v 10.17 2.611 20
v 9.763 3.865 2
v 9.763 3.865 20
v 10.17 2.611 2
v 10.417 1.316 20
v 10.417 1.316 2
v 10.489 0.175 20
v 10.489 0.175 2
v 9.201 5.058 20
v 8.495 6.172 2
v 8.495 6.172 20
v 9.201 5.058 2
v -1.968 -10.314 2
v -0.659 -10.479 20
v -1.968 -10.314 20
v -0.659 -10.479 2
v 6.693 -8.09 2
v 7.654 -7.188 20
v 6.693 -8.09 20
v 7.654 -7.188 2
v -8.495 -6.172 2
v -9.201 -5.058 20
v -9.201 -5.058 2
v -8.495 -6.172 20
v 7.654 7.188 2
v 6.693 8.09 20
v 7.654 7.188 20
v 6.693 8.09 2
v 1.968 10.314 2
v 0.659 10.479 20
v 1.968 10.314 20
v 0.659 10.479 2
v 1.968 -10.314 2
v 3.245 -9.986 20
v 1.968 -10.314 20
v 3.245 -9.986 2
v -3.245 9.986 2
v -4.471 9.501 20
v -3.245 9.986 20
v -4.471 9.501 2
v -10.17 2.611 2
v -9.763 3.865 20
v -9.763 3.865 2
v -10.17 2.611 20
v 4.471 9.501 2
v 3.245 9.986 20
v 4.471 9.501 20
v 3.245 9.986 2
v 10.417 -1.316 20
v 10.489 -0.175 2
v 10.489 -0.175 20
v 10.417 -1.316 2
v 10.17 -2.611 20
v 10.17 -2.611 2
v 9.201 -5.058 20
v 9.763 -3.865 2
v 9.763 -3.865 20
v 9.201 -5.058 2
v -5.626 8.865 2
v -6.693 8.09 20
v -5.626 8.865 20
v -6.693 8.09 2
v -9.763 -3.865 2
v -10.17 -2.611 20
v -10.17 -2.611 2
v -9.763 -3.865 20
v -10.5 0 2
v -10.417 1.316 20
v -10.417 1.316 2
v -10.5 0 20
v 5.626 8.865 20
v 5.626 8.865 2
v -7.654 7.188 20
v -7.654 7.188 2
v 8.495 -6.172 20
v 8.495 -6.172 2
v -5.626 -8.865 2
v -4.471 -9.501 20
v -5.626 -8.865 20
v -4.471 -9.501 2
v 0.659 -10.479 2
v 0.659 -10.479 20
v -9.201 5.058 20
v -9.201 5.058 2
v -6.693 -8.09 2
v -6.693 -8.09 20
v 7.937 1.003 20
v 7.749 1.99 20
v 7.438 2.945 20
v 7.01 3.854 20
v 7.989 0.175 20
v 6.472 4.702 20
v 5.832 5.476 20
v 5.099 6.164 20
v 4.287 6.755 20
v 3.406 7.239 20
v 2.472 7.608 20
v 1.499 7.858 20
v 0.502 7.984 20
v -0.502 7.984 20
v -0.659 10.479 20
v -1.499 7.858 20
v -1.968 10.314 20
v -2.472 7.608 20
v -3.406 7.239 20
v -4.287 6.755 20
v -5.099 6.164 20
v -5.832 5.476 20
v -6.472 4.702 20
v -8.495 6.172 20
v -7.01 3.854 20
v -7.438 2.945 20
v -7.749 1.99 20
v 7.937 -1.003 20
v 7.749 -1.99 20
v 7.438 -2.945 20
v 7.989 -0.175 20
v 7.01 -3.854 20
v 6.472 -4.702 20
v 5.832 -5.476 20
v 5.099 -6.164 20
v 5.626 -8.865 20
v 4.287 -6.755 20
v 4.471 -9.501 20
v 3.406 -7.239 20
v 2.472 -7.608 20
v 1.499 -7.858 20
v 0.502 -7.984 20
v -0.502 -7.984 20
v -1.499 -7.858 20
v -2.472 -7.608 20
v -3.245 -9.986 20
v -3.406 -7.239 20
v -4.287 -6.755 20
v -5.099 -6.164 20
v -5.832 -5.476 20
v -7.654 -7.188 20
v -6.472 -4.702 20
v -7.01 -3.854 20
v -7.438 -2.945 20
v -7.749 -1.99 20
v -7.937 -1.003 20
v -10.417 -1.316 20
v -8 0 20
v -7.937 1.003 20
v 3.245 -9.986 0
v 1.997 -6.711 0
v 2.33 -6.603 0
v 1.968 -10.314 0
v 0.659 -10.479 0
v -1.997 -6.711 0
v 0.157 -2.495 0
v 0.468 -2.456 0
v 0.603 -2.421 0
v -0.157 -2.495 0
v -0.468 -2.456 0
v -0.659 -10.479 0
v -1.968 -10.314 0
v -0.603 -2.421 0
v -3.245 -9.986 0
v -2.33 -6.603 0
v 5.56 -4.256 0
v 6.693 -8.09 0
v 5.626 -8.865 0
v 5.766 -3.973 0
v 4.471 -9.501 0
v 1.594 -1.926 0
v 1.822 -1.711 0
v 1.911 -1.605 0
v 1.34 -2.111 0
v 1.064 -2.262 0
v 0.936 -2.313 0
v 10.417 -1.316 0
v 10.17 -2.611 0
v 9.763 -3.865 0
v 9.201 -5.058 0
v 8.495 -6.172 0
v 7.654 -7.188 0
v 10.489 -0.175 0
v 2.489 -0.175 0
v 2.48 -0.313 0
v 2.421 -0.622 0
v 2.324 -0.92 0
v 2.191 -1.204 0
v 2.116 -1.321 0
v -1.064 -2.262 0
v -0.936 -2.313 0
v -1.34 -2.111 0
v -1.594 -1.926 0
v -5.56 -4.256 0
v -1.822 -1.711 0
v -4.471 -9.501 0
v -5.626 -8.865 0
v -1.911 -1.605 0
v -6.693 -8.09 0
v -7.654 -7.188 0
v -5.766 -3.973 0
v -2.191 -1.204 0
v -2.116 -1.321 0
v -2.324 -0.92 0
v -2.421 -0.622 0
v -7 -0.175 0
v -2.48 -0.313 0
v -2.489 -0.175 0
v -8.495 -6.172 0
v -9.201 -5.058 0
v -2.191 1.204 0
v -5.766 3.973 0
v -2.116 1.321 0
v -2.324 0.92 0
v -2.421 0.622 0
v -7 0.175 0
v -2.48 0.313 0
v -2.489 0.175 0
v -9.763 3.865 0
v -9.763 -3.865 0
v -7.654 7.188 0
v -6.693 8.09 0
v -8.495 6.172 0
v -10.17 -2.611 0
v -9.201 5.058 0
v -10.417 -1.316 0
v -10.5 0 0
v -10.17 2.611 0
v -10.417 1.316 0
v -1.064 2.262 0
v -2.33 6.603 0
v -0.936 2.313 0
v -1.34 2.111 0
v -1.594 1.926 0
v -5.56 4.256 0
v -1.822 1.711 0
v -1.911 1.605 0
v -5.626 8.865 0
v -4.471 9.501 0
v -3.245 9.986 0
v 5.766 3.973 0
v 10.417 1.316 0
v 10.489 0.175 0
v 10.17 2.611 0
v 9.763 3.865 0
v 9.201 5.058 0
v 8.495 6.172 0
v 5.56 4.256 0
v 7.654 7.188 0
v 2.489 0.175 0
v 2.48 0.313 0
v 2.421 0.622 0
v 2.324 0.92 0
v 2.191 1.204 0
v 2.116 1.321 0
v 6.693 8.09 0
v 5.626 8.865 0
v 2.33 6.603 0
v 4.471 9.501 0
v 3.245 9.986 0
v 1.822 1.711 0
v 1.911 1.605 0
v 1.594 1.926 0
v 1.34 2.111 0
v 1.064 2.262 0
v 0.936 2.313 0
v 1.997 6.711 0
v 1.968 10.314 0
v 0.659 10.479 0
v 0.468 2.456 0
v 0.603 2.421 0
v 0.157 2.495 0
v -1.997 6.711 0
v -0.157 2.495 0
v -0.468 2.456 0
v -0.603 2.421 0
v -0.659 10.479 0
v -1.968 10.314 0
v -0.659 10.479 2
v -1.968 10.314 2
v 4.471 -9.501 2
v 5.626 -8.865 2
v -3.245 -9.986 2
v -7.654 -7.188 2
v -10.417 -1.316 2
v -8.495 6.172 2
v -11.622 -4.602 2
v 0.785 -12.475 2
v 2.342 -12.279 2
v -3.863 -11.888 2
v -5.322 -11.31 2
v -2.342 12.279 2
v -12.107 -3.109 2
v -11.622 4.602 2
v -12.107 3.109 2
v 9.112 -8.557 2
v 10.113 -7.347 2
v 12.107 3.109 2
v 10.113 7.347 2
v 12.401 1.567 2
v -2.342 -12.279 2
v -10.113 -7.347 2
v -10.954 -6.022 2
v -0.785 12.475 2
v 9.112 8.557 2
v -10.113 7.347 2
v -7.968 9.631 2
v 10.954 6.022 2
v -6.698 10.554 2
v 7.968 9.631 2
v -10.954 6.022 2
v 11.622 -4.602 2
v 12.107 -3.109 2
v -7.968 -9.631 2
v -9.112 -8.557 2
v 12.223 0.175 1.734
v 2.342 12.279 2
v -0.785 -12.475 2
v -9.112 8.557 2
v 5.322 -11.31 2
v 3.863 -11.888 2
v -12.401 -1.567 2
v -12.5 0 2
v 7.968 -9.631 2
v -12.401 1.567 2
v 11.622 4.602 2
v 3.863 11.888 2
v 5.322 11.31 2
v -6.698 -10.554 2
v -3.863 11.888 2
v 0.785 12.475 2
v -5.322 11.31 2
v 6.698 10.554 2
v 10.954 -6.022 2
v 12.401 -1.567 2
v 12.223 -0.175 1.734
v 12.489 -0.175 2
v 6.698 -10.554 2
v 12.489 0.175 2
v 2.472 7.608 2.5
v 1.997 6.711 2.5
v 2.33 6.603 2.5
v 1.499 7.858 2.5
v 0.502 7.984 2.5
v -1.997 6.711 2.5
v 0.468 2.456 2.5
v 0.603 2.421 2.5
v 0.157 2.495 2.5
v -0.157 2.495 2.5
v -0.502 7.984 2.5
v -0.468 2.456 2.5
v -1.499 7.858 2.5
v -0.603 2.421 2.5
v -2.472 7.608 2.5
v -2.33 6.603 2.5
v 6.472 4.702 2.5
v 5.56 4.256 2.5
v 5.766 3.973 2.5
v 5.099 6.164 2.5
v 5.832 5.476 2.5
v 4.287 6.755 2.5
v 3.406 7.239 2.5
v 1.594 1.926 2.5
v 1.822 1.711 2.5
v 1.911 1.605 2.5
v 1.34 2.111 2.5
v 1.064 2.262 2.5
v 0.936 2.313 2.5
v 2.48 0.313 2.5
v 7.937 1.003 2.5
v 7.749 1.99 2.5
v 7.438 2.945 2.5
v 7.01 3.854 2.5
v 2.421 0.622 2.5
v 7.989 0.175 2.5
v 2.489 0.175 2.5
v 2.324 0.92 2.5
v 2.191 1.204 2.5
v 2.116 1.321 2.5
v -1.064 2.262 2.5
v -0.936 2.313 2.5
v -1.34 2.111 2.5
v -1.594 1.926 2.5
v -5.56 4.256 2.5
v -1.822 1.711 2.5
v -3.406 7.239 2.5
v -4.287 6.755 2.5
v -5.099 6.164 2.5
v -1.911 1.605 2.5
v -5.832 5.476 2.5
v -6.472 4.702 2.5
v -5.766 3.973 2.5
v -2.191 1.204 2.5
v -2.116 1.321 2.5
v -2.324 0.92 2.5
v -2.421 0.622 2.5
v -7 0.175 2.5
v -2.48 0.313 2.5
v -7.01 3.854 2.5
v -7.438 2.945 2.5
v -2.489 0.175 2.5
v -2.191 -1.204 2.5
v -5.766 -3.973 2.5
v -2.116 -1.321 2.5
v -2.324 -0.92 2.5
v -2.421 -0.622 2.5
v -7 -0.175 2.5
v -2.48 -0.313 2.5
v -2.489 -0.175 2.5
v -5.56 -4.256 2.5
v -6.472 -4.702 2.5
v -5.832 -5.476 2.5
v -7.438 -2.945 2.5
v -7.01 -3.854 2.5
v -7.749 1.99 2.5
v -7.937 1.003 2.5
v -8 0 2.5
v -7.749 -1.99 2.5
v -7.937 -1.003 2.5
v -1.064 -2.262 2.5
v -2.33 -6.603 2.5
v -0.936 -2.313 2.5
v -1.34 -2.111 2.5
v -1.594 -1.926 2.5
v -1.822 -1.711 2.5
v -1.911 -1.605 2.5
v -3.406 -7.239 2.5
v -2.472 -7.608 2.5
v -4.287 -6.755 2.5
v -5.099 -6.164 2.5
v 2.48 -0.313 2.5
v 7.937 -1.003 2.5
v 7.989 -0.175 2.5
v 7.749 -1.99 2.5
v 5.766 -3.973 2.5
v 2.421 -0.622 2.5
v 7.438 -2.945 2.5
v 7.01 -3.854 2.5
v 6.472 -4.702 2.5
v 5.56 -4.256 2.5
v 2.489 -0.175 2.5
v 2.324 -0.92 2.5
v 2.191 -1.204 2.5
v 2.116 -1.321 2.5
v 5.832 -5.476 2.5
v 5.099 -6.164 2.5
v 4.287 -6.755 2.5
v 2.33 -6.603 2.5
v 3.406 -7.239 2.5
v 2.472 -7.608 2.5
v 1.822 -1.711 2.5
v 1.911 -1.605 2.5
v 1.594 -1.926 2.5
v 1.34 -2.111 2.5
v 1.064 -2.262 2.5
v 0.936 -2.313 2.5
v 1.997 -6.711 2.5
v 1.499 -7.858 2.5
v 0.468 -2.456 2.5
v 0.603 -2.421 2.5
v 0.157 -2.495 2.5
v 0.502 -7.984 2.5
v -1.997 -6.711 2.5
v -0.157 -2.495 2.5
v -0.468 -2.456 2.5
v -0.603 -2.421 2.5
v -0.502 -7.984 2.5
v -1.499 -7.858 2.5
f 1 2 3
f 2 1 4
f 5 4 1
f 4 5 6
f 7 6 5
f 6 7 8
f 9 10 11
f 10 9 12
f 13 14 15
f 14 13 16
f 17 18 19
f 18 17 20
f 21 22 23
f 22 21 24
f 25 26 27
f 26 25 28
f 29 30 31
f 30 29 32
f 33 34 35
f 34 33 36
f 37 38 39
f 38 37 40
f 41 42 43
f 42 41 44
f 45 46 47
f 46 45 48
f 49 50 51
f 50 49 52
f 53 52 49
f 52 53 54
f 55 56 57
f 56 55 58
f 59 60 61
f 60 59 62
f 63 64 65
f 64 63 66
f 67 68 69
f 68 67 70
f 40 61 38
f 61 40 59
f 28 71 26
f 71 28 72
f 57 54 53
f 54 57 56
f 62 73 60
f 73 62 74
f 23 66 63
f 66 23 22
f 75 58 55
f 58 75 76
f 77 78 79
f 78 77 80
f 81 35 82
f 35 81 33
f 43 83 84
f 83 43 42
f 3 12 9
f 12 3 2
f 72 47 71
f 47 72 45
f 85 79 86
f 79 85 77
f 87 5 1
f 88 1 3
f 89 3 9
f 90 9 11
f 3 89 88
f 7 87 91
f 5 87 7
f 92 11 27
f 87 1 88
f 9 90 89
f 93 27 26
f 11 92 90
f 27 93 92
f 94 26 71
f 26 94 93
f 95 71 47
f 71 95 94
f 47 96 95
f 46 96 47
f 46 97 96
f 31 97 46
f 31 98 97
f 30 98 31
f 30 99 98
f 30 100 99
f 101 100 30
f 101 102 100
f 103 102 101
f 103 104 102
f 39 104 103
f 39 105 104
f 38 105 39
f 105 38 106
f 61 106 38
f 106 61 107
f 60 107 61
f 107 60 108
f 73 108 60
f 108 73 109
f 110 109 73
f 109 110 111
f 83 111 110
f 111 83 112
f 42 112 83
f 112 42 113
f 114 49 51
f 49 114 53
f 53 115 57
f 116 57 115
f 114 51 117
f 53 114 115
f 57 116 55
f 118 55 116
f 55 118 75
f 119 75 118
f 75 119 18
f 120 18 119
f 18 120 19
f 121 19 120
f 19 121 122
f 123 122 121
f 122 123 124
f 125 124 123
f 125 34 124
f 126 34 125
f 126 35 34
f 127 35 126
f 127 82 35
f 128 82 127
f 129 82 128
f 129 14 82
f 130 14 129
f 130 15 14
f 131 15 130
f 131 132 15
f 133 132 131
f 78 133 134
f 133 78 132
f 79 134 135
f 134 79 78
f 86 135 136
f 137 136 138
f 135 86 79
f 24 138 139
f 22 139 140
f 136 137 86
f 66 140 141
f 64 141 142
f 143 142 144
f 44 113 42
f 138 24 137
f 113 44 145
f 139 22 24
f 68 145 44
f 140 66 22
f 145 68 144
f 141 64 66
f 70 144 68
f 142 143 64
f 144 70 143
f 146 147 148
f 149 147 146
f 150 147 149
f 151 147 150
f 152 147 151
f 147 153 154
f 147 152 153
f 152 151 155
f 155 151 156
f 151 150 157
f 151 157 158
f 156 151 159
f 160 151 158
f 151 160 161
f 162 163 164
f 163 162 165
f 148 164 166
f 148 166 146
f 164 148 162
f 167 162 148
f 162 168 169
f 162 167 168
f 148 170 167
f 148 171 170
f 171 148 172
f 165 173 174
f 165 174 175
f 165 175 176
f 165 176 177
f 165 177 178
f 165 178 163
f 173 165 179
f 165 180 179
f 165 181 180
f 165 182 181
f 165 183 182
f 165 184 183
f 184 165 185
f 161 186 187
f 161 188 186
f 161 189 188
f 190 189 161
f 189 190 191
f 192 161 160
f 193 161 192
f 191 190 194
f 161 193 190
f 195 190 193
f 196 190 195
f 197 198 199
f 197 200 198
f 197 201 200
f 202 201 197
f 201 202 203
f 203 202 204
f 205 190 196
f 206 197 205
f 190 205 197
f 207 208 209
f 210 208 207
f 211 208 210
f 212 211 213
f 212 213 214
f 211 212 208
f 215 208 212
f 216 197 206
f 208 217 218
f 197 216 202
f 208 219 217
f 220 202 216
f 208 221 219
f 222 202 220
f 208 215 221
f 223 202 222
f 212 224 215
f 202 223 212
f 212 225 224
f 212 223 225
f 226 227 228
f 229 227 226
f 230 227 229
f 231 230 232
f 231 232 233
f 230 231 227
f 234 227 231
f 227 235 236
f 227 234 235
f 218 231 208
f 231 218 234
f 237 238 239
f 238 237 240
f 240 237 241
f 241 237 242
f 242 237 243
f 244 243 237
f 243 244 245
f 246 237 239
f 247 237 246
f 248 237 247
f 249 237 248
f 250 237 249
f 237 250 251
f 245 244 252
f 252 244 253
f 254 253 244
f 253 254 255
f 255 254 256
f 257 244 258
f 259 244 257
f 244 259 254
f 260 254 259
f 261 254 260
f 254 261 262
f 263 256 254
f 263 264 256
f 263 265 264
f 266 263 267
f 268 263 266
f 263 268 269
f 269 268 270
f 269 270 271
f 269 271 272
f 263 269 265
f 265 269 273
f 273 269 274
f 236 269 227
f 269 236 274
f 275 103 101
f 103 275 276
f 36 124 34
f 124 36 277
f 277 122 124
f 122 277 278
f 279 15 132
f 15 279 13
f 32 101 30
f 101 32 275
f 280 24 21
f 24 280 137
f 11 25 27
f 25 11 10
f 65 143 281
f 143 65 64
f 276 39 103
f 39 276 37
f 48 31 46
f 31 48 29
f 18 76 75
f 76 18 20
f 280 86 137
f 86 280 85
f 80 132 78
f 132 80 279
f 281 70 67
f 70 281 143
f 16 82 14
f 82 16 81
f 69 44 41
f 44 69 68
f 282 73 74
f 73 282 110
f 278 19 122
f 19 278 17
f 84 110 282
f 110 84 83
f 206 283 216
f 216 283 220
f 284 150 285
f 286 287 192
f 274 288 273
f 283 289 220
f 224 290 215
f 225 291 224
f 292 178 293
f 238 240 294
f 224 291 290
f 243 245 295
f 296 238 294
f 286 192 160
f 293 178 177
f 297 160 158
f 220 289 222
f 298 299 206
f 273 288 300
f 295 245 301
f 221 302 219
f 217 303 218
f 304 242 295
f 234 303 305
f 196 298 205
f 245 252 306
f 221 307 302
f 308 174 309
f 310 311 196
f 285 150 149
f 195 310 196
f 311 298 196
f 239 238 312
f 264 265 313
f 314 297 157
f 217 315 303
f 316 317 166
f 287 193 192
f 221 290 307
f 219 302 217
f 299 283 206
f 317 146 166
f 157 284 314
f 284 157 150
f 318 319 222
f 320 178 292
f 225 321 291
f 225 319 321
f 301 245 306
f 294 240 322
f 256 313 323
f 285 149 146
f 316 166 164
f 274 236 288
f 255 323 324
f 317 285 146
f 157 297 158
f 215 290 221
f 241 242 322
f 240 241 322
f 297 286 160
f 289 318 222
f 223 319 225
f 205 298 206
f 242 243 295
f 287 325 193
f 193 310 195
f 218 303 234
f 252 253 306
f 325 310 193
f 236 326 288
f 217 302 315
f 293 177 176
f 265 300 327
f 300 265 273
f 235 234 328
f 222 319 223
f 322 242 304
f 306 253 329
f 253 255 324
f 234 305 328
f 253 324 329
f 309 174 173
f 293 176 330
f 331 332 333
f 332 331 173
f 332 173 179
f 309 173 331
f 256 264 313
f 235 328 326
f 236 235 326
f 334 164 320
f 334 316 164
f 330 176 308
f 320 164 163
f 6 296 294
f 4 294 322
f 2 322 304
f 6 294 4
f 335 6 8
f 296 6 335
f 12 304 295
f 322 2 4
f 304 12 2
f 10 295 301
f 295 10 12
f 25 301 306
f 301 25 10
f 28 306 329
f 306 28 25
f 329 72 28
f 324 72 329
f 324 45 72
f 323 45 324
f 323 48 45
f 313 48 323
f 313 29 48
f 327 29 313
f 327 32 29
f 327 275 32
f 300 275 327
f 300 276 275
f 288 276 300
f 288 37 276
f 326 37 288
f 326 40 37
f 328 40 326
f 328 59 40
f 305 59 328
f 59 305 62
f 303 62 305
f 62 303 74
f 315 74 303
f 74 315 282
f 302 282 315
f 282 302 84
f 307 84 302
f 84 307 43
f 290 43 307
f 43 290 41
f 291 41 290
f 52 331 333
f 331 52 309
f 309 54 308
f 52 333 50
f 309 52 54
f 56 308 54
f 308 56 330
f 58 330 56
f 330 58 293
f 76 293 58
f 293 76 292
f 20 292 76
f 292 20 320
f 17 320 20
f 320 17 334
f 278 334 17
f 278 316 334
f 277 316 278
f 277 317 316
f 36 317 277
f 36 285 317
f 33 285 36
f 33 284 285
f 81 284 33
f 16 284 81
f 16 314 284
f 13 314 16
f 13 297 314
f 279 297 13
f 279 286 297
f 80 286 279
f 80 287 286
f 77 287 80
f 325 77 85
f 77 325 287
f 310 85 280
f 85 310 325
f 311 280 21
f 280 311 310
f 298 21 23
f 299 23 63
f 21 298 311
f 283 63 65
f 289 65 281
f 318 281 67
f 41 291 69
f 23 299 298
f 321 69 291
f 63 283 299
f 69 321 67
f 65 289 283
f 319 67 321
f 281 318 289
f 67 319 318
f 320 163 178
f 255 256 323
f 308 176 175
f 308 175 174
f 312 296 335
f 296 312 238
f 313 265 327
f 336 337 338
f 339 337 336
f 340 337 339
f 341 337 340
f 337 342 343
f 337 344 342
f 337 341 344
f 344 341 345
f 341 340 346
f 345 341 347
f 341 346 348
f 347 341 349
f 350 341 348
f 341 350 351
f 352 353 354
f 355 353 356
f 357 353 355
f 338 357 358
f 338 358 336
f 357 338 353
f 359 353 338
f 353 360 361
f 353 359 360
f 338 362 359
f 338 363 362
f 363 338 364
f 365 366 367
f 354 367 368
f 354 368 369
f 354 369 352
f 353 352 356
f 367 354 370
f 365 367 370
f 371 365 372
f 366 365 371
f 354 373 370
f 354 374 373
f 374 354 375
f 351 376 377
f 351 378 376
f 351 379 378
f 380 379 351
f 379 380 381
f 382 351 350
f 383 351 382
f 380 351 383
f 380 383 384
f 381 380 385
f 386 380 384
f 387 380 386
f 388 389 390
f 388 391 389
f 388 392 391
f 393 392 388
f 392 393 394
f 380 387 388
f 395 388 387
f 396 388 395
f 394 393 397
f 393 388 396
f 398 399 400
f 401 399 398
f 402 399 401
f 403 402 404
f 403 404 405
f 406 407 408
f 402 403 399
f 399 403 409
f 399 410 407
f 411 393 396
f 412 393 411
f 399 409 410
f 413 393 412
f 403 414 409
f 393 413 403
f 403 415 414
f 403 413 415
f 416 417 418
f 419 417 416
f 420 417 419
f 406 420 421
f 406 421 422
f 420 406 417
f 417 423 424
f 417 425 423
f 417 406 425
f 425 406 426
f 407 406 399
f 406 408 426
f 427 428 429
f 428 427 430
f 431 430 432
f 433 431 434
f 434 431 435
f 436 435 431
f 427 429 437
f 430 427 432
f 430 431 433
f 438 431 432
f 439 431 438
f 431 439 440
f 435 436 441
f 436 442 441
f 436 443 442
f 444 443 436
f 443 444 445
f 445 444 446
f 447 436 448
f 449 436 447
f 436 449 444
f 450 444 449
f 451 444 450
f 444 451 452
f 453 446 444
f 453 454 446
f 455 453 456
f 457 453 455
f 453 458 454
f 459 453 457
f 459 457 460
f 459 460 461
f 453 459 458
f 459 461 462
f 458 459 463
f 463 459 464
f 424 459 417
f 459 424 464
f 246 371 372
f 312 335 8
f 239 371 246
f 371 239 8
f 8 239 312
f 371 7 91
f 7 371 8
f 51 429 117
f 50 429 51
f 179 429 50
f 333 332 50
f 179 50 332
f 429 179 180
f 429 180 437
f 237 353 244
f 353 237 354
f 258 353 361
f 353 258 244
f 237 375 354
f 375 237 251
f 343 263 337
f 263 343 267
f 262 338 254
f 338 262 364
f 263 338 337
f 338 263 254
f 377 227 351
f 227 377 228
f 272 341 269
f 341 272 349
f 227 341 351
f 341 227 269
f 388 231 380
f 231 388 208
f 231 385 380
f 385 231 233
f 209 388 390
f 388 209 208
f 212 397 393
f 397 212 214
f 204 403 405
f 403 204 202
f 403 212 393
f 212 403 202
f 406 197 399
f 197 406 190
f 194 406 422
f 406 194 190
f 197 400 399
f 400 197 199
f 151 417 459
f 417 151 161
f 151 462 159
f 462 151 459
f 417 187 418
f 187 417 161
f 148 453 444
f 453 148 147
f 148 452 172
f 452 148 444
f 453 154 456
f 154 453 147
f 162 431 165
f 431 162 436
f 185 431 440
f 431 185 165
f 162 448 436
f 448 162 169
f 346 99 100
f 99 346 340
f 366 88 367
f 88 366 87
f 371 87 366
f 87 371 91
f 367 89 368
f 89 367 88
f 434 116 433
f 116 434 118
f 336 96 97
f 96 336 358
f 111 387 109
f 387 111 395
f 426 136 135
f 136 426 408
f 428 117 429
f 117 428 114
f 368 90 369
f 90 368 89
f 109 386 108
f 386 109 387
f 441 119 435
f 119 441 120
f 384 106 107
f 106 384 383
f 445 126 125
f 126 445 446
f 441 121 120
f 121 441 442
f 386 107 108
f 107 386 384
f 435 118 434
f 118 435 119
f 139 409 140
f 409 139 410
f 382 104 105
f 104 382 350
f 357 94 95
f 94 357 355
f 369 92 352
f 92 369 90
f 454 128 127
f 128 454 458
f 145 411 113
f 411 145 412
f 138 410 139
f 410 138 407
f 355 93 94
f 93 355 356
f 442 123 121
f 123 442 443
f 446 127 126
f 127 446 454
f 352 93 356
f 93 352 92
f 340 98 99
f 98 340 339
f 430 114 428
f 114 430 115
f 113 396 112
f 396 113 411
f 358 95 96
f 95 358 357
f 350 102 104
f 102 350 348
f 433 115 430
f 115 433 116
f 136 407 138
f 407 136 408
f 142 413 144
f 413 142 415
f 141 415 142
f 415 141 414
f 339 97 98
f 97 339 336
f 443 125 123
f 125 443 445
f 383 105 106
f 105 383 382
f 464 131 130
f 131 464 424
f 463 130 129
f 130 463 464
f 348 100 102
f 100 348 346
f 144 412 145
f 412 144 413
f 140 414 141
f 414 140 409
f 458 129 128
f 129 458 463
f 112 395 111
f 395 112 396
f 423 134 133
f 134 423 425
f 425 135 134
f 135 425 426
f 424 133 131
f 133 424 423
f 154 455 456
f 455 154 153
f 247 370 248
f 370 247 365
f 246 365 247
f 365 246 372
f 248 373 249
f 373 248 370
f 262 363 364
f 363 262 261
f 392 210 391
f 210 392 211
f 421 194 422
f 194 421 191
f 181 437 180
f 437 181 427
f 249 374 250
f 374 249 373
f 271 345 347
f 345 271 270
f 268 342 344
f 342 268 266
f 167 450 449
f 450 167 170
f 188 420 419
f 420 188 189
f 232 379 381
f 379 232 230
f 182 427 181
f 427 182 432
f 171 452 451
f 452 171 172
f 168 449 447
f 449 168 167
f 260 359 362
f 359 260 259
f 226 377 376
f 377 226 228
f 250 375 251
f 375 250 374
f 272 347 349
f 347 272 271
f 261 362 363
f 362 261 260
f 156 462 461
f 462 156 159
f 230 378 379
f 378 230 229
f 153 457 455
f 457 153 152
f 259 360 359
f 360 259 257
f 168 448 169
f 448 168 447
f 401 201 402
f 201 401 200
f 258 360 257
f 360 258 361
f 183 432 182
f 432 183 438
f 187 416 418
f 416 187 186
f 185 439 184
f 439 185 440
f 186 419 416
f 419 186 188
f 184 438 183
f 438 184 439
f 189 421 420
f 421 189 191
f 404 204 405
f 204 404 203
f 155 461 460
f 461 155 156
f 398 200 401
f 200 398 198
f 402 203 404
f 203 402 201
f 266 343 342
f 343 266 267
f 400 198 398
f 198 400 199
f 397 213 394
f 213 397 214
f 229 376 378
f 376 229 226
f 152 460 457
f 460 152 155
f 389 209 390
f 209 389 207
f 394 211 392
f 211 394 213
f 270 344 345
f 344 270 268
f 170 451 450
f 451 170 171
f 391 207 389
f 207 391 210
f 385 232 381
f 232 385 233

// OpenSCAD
/* [Hidden] */ ////////////////////////////
$fn = 50;

/* [Plug] */ ////////////////////////////
// Innerdiameter of the Plug (aka ID of the Pipe)?
id = 21;

// Outerdiameter of the Plug (aka OD of the Pipe; used for the chamfer)?
od = 25;

// Height?
h = 20;

// Wallthickness?
w = 2.5;

// Slotted?
s = 1; // [1:Yes, 0:No]

/* [Cuts] */ ////////////////////////////
// Center-Hole-Diameter?
chd = 5;

// Cut-Diameter?
cd = 14;

// How many Cuts?
cc = 10;

// Cut-Thickness? 
cw = 0.35;

////////////////////////////

difference() {
	union() {
		cylinder(r=id/2, h=h);

		hull() {
			cylinder(r=id/2, h=(od-id)/2);
			translate([0, 0, (od-id)/2]) cylinder(r=od/2, h=0.00001);
		}
	}
	
	union() {
		translate([0, 0, w]) cylinder(r=(id/2-w), h=h-w);
		
		// slot
		if(s==1) {
			translate([0, -cw/2, 0]) cube([od/2, cw, h]);
		}
		
		// cuts
		for(i = [0:cc]) {
			rotate([0, 0, i*360/cc]) translate([0, -cw/2, 0]) cube([cd/2, cw, w]);
		}
		cylinder(r=chd/2, h=w);
	}
}
